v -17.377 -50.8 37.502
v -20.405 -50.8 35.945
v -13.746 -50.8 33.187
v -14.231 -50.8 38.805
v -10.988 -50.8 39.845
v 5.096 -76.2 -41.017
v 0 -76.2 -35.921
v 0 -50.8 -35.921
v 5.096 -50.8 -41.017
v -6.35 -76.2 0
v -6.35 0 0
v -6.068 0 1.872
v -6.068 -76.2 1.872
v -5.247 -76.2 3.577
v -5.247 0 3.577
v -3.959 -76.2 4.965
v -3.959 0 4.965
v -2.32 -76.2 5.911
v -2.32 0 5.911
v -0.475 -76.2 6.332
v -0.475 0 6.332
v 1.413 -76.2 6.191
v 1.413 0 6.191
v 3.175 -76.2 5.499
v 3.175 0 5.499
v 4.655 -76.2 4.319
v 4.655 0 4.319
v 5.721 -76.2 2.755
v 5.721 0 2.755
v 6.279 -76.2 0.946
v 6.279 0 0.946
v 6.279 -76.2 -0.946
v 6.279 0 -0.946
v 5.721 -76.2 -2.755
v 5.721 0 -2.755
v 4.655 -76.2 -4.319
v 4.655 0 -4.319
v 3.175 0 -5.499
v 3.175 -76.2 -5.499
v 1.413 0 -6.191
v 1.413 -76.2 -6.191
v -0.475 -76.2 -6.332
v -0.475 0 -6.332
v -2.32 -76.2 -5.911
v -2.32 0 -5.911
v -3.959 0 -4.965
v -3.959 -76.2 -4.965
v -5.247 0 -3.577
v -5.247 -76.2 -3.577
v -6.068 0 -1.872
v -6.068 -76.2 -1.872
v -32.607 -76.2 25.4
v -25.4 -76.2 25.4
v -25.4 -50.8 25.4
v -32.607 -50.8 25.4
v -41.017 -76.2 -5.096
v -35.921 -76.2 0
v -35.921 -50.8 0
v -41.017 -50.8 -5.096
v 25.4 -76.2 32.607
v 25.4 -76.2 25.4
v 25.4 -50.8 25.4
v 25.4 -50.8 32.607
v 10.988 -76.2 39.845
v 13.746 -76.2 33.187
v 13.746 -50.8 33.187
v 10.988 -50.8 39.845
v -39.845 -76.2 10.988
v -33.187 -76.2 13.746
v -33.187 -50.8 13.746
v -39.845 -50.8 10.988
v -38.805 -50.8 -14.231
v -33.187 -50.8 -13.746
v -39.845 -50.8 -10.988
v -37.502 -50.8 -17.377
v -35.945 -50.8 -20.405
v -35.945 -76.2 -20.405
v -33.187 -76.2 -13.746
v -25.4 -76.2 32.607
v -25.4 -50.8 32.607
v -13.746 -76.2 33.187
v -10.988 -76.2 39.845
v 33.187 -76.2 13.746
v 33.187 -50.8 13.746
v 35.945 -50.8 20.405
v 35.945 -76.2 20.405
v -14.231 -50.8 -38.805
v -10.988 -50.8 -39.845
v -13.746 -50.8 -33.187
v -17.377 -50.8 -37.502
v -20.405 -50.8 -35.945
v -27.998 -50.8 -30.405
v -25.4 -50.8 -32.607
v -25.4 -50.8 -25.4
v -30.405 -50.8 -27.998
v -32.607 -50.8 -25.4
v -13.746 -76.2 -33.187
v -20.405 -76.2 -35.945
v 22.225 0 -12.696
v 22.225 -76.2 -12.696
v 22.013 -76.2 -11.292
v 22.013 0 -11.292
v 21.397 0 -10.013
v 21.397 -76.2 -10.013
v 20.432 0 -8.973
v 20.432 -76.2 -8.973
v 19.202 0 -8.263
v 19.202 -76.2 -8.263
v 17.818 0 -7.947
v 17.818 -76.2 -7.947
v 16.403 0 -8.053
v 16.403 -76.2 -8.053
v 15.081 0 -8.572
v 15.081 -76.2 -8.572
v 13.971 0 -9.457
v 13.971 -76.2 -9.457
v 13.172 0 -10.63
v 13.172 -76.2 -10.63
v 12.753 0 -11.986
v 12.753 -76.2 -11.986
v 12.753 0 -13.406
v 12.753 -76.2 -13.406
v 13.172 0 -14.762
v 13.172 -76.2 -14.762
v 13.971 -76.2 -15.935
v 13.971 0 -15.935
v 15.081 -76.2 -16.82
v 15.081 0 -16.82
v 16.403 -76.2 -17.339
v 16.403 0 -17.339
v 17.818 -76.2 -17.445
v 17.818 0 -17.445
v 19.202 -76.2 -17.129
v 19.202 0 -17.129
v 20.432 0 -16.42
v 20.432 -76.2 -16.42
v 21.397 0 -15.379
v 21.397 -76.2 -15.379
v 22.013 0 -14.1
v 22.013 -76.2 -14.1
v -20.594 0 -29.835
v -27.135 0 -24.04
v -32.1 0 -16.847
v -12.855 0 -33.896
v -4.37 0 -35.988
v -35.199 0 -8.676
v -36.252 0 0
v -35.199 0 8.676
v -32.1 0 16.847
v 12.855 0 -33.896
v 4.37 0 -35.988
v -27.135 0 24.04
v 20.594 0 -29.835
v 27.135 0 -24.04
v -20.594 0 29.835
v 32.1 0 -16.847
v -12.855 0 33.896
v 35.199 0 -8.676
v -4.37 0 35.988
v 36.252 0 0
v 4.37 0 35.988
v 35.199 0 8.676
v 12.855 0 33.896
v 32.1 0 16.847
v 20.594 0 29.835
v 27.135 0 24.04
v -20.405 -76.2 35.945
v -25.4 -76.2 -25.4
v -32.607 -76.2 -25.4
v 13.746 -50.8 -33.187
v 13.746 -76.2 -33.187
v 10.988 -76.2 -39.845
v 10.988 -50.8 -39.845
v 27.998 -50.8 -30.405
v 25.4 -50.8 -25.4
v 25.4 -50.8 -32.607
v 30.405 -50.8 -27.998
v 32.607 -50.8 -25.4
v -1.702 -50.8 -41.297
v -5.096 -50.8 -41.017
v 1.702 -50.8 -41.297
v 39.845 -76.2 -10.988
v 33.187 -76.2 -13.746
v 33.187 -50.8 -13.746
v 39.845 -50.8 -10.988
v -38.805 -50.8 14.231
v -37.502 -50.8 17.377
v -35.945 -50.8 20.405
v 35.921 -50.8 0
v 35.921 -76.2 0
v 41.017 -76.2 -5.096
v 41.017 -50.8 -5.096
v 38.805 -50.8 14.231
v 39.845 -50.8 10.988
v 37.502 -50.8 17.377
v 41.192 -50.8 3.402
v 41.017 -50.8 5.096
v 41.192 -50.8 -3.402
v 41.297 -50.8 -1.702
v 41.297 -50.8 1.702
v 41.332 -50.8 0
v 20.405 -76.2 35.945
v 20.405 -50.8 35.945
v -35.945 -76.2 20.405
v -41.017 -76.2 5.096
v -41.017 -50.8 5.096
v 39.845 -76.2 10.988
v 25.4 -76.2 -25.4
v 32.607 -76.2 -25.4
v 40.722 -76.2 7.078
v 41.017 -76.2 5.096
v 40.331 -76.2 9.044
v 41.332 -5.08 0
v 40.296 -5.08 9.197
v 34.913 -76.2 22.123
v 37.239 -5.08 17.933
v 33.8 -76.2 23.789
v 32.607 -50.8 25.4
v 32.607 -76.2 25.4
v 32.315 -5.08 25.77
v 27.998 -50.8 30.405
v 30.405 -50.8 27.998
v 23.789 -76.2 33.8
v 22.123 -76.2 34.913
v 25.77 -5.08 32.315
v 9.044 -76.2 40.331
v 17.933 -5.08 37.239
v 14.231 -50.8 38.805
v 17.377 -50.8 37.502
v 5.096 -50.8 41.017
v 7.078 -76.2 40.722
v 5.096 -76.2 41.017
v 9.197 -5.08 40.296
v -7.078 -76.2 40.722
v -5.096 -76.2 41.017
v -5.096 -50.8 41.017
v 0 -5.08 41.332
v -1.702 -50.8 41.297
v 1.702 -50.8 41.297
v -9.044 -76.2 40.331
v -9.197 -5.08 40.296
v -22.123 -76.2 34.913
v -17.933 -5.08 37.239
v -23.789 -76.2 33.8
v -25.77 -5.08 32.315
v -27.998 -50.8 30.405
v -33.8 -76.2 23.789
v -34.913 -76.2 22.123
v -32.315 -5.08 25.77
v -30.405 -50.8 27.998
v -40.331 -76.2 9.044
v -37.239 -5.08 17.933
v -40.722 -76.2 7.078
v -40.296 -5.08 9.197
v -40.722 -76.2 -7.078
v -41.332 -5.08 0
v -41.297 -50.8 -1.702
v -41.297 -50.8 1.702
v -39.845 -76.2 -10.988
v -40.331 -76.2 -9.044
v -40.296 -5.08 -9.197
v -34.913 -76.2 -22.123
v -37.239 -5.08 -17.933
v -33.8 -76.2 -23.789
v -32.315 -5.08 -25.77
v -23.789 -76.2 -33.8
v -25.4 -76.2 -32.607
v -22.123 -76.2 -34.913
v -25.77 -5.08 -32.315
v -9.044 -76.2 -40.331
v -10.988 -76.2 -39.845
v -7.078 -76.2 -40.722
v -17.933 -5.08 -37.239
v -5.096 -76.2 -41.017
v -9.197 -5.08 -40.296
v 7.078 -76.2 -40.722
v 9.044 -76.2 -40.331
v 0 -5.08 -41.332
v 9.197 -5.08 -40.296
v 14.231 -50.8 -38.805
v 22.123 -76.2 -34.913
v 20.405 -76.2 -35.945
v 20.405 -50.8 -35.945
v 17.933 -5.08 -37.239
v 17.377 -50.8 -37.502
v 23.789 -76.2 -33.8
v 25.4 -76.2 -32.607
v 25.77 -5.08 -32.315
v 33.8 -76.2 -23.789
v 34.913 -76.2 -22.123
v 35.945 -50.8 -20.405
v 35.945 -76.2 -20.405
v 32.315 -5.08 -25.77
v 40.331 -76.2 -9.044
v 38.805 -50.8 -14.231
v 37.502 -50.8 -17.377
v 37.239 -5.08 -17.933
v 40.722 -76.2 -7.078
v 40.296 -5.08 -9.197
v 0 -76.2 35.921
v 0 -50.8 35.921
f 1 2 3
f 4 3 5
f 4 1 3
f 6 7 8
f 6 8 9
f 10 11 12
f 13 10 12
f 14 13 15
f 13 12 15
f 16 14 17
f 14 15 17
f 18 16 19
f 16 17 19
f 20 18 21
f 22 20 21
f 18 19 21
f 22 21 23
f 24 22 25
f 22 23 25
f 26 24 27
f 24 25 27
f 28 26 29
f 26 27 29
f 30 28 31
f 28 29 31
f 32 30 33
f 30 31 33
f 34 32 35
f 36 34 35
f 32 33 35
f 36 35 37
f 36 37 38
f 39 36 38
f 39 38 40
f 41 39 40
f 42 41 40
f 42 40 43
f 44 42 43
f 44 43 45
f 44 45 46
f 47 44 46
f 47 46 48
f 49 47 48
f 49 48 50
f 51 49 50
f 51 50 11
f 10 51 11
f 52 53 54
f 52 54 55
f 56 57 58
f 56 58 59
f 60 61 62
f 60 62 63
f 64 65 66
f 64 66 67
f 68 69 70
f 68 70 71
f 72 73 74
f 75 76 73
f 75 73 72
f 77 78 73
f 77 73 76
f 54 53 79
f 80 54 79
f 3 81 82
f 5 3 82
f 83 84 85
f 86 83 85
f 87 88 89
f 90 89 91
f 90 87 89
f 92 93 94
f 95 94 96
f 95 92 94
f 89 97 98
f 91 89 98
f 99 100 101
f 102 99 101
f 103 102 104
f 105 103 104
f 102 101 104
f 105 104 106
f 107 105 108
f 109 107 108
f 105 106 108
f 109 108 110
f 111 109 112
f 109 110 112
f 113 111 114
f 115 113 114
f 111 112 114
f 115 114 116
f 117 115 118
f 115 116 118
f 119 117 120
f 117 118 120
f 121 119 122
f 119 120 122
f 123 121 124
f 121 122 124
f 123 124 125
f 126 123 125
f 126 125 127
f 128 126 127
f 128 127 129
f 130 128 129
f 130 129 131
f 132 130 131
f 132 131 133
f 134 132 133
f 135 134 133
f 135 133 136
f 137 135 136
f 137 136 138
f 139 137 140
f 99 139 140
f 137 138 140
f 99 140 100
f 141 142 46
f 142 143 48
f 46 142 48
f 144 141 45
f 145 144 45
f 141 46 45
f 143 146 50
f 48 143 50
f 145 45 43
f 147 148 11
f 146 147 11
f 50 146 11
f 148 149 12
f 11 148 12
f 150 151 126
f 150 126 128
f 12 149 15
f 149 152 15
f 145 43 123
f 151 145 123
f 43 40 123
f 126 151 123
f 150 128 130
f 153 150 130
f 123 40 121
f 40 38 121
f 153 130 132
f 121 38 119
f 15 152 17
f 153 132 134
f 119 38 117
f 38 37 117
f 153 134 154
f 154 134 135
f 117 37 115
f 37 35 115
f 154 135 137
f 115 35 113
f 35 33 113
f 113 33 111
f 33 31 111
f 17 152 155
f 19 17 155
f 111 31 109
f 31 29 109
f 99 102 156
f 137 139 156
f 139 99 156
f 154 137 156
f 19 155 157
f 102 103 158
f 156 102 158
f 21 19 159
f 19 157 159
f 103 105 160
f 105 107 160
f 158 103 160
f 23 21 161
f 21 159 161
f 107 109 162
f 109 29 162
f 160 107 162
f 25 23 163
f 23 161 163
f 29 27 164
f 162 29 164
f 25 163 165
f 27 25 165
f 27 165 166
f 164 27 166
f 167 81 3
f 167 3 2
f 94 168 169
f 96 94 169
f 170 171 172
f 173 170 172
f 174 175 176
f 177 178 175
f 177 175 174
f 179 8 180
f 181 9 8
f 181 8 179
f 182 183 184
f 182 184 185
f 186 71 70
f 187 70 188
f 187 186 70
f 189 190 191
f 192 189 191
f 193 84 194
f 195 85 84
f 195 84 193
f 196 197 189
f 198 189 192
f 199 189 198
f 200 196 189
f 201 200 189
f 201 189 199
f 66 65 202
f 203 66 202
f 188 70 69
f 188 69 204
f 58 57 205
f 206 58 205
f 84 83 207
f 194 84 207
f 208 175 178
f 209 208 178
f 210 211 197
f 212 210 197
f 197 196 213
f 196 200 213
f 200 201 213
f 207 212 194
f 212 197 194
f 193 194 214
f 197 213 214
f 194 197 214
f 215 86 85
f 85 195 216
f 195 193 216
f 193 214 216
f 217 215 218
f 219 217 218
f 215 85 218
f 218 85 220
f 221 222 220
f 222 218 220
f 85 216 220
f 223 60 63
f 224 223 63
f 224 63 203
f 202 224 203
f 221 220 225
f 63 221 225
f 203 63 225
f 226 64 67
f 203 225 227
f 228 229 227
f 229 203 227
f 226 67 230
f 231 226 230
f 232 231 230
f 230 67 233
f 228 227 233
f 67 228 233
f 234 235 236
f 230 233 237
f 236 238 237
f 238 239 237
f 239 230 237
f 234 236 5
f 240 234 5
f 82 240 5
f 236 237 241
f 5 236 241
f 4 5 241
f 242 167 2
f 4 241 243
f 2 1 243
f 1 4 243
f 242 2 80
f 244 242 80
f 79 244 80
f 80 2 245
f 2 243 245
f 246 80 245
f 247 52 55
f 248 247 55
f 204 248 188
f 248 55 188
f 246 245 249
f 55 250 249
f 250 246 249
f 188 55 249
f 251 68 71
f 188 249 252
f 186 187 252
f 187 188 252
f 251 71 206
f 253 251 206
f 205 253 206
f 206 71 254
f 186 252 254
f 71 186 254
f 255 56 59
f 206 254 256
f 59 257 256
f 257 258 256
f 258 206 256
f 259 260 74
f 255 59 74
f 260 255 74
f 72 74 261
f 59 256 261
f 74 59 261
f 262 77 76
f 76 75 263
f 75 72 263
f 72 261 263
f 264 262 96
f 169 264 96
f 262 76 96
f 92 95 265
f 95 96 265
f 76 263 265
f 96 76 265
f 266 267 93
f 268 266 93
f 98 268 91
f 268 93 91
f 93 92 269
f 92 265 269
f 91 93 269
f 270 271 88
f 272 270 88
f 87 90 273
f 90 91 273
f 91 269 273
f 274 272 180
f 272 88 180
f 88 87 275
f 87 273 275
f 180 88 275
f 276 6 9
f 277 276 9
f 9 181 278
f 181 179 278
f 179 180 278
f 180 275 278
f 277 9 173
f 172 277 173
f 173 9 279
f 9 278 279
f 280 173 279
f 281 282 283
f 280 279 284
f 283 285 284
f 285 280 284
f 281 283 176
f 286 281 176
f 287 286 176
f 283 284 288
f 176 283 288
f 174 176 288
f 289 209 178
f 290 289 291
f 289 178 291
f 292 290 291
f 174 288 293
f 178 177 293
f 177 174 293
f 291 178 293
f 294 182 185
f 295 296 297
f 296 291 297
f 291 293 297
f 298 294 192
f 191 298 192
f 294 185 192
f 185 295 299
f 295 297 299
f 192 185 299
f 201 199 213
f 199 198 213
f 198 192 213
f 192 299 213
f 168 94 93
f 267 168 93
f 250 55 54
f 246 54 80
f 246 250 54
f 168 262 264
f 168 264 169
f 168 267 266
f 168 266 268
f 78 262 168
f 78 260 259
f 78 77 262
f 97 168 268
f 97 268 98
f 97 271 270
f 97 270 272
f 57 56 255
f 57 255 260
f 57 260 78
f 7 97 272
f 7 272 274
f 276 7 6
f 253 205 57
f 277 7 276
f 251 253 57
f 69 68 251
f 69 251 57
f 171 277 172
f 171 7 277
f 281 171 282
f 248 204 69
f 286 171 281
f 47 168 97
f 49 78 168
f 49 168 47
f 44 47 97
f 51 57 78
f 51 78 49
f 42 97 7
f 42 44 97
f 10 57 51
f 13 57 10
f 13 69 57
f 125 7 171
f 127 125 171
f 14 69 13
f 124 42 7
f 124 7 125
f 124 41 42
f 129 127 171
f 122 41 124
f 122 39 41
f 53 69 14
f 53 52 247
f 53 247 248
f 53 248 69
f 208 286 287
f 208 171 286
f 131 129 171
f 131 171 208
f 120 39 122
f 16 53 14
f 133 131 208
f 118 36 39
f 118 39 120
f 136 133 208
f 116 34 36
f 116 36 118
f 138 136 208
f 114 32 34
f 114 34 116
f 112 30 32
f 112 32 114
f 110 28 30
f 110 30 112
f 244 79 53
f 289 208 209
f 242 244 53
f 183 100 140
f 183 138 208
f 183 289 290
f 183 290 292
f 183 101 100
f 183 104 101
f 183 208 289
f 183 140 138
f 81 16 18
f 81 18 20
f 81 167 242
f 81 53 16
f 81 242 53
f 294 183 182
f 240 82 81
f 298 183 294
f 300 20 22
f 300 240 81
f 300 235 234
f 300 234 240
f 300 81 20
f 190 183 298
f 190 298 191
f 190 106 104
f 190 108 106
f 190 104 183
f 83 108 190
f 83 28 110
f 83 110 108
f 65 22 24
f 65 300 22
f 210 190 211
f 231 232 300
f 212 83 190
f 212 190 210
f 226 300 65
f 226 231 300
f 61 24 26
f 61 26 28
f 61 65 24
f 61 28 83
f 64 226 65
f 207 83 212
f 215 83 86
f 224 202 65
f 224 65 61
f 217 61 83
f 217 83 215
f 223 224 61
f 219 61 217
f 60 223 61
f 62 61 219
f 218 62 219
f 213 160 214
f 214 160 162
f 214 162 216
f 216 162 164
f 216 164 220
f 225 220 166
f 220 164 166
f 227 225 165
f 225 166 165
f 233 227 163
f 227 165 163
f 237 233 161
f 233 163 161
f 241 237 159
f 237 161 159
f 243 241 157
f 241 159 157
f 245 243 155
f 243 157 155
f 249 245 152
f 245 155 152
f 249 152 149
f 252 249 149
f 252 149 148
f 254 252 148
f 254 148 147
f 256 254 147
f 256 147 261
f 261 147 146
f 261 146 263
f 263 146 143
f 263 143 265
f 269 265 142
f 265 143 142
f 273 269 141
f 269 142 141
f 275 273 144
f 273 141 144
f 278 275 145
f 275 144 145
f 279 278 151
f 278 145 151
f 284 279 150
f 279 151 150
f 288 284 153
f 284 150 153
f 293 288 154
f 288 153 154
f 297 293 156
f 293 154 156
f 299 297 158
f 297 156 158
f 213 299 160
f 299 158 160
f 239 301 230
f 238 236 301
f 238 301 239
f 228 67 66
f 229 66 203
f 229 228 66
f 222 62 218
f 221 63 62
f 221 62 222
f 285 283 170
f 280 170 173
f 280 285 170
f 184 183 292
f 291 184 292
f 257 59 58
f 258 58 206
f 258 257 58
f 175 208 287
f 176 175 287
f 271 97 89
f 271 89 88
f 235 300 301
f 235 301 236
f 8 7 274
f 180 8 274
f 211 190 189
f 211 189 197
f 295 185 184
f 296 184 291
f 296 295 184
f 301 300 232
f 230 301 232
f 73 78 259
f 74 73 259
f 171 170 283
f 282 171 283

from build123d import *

# Parameters (mm, degrees)
F0_R            = 41.3322868319
F1_DEPTH        = 76.2
F2_W            = 25.4
F2_H            = 25.4
F3_DEPTH        = 25.4
F3_COPIES_COUNT = 16
F4_SIZE         = 5.08
F6_D            = 12.7
F7_R            = 4.7625
F8_DEPTH        = 76.2


# Not quite as in the source:
# - a pattern or mirror of a feature is missing from the dataset's text; its kind, count and spacing are read off the source's solid


with BuildPart() as f1:
    # F0 (on Front) → F1 (new body)
    with BuildSketch(Plane.XZ):
        Circle(F0_R)
    extrude(amount=F1_DEPTH)

    # F2 (on face) → F3 (cut)
    with BuildSketch(Plane.XZ.offset(76.2)):
        with Locations((38.1, 38.1)):
            Rectangle(F2_W, F2_H)
    f3 = extrude(amount=-F3_DEPTH, mode=Mode.SUBTRACT)

    # F3_copies: F3 ×16 about axis
    f3_copies_axis = Axis((0, 0, 0), (0, 1, 0))
    for i in range(1, F3_COPIES_COUNT):
        add(f3.rotate(f3_copies_axis, i * 360 / F3_COPIES_COUNT), mode=Mode.SUBTRACT)

    # F4
    f4_edges = [f1.edges().sort_by_distance(p)[0] for p in [
        (-41.332287, 0, 0),
    ]]
    chamfer(f4_edges, length=F4_SIZE)

    # F6 (through all)
    with Locations(Plane.XZ.offset(76.2)):
        with Locations((0, 0)):
            Hole(F6_D / 2)

    # F7 (on face) → F8 (cut, through all)
    with BuildSketch(Plane.XZ.offset(76.2)):
        with Locations((17.4625, -12.6960306297)):
            Circle(F7_R)
    extrude(amount=-F8_DEPTH, mode=Mode.SUBTRACT)


solid = f1.part
